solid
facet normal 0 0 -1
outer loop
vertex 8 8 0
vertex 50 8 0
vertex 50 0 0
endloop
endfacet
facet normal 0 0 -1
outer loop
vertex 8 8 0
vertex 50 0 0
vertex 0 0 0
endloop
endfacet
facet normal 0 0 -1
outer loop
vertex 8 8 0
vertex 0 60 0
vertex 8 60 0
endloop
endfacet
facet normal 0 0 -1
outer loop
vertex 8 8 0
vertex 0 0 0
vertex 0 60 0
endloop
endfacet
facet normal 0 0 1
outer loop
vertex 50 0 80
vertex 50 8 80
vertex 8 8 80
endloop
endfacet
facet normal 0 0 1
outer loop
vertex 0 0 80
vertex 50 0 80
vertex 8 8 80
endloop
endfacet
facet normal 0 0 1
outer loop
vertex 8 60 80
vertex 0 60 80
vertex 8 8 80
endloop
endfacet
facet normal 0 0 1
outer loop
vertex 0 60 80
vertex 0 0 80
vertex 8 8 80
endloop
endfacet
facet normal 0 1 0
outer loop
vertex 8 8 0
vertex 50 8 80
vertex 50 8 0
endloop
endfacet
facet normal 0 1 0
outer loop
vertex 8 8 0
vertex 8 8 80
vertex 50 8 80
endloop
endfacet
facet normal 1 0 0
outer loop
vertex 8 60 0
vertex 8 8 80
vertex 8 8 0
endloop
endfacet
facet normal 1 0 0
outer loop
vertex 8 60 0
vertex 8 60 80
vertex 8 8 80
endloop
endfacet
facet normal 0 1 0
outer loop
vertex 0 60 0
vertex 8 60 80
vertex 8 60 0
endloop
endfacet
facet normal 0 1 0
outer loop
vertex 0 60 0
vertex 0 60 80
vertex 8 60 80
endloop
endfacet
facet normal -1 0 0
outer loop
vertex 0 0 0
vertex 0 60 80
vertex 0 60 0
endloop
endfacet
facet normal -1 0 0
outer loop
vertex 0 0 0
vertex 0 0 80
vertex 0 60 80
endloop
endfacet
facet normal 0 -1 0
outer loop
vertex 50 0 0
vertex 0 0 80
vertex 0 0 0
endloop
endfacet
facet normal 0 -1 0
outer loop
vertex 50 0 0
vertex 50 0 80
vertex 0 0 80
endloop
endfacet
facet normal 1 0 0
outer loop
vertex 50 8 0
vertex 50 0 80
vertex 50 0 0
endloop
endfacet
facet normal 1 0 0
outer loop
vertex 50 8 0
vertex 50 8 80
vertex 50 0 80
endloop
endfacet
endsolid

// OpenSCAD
$fn = 32;

// ----------------------------------------------------------------------
// Structural section: angle 50 x 60 mm
// ----------------------------------------------------------------------

// --- parameters (mm) ---
sec_w = 50;               // leg width, X
sec_h = 60;               // leg height, Y
flange_t = 8;             // leg thickness
plate_t = 80;             // cut length, Z (extrusion height)
fit_tol = 0.05;           // declared fit tolerance (prompt contract)
free_tol = 0.2;           // declared free tolerance (prompt contract)

profile = [[0, 0], [50, 0], [50, 8], [8, 8], [8, 60], [0, 60]];  // primary outline, 6 points, counter clockwise

// --- the one profile operation ---
linear_extrude(height = plate_t) polygon(points = profile);
